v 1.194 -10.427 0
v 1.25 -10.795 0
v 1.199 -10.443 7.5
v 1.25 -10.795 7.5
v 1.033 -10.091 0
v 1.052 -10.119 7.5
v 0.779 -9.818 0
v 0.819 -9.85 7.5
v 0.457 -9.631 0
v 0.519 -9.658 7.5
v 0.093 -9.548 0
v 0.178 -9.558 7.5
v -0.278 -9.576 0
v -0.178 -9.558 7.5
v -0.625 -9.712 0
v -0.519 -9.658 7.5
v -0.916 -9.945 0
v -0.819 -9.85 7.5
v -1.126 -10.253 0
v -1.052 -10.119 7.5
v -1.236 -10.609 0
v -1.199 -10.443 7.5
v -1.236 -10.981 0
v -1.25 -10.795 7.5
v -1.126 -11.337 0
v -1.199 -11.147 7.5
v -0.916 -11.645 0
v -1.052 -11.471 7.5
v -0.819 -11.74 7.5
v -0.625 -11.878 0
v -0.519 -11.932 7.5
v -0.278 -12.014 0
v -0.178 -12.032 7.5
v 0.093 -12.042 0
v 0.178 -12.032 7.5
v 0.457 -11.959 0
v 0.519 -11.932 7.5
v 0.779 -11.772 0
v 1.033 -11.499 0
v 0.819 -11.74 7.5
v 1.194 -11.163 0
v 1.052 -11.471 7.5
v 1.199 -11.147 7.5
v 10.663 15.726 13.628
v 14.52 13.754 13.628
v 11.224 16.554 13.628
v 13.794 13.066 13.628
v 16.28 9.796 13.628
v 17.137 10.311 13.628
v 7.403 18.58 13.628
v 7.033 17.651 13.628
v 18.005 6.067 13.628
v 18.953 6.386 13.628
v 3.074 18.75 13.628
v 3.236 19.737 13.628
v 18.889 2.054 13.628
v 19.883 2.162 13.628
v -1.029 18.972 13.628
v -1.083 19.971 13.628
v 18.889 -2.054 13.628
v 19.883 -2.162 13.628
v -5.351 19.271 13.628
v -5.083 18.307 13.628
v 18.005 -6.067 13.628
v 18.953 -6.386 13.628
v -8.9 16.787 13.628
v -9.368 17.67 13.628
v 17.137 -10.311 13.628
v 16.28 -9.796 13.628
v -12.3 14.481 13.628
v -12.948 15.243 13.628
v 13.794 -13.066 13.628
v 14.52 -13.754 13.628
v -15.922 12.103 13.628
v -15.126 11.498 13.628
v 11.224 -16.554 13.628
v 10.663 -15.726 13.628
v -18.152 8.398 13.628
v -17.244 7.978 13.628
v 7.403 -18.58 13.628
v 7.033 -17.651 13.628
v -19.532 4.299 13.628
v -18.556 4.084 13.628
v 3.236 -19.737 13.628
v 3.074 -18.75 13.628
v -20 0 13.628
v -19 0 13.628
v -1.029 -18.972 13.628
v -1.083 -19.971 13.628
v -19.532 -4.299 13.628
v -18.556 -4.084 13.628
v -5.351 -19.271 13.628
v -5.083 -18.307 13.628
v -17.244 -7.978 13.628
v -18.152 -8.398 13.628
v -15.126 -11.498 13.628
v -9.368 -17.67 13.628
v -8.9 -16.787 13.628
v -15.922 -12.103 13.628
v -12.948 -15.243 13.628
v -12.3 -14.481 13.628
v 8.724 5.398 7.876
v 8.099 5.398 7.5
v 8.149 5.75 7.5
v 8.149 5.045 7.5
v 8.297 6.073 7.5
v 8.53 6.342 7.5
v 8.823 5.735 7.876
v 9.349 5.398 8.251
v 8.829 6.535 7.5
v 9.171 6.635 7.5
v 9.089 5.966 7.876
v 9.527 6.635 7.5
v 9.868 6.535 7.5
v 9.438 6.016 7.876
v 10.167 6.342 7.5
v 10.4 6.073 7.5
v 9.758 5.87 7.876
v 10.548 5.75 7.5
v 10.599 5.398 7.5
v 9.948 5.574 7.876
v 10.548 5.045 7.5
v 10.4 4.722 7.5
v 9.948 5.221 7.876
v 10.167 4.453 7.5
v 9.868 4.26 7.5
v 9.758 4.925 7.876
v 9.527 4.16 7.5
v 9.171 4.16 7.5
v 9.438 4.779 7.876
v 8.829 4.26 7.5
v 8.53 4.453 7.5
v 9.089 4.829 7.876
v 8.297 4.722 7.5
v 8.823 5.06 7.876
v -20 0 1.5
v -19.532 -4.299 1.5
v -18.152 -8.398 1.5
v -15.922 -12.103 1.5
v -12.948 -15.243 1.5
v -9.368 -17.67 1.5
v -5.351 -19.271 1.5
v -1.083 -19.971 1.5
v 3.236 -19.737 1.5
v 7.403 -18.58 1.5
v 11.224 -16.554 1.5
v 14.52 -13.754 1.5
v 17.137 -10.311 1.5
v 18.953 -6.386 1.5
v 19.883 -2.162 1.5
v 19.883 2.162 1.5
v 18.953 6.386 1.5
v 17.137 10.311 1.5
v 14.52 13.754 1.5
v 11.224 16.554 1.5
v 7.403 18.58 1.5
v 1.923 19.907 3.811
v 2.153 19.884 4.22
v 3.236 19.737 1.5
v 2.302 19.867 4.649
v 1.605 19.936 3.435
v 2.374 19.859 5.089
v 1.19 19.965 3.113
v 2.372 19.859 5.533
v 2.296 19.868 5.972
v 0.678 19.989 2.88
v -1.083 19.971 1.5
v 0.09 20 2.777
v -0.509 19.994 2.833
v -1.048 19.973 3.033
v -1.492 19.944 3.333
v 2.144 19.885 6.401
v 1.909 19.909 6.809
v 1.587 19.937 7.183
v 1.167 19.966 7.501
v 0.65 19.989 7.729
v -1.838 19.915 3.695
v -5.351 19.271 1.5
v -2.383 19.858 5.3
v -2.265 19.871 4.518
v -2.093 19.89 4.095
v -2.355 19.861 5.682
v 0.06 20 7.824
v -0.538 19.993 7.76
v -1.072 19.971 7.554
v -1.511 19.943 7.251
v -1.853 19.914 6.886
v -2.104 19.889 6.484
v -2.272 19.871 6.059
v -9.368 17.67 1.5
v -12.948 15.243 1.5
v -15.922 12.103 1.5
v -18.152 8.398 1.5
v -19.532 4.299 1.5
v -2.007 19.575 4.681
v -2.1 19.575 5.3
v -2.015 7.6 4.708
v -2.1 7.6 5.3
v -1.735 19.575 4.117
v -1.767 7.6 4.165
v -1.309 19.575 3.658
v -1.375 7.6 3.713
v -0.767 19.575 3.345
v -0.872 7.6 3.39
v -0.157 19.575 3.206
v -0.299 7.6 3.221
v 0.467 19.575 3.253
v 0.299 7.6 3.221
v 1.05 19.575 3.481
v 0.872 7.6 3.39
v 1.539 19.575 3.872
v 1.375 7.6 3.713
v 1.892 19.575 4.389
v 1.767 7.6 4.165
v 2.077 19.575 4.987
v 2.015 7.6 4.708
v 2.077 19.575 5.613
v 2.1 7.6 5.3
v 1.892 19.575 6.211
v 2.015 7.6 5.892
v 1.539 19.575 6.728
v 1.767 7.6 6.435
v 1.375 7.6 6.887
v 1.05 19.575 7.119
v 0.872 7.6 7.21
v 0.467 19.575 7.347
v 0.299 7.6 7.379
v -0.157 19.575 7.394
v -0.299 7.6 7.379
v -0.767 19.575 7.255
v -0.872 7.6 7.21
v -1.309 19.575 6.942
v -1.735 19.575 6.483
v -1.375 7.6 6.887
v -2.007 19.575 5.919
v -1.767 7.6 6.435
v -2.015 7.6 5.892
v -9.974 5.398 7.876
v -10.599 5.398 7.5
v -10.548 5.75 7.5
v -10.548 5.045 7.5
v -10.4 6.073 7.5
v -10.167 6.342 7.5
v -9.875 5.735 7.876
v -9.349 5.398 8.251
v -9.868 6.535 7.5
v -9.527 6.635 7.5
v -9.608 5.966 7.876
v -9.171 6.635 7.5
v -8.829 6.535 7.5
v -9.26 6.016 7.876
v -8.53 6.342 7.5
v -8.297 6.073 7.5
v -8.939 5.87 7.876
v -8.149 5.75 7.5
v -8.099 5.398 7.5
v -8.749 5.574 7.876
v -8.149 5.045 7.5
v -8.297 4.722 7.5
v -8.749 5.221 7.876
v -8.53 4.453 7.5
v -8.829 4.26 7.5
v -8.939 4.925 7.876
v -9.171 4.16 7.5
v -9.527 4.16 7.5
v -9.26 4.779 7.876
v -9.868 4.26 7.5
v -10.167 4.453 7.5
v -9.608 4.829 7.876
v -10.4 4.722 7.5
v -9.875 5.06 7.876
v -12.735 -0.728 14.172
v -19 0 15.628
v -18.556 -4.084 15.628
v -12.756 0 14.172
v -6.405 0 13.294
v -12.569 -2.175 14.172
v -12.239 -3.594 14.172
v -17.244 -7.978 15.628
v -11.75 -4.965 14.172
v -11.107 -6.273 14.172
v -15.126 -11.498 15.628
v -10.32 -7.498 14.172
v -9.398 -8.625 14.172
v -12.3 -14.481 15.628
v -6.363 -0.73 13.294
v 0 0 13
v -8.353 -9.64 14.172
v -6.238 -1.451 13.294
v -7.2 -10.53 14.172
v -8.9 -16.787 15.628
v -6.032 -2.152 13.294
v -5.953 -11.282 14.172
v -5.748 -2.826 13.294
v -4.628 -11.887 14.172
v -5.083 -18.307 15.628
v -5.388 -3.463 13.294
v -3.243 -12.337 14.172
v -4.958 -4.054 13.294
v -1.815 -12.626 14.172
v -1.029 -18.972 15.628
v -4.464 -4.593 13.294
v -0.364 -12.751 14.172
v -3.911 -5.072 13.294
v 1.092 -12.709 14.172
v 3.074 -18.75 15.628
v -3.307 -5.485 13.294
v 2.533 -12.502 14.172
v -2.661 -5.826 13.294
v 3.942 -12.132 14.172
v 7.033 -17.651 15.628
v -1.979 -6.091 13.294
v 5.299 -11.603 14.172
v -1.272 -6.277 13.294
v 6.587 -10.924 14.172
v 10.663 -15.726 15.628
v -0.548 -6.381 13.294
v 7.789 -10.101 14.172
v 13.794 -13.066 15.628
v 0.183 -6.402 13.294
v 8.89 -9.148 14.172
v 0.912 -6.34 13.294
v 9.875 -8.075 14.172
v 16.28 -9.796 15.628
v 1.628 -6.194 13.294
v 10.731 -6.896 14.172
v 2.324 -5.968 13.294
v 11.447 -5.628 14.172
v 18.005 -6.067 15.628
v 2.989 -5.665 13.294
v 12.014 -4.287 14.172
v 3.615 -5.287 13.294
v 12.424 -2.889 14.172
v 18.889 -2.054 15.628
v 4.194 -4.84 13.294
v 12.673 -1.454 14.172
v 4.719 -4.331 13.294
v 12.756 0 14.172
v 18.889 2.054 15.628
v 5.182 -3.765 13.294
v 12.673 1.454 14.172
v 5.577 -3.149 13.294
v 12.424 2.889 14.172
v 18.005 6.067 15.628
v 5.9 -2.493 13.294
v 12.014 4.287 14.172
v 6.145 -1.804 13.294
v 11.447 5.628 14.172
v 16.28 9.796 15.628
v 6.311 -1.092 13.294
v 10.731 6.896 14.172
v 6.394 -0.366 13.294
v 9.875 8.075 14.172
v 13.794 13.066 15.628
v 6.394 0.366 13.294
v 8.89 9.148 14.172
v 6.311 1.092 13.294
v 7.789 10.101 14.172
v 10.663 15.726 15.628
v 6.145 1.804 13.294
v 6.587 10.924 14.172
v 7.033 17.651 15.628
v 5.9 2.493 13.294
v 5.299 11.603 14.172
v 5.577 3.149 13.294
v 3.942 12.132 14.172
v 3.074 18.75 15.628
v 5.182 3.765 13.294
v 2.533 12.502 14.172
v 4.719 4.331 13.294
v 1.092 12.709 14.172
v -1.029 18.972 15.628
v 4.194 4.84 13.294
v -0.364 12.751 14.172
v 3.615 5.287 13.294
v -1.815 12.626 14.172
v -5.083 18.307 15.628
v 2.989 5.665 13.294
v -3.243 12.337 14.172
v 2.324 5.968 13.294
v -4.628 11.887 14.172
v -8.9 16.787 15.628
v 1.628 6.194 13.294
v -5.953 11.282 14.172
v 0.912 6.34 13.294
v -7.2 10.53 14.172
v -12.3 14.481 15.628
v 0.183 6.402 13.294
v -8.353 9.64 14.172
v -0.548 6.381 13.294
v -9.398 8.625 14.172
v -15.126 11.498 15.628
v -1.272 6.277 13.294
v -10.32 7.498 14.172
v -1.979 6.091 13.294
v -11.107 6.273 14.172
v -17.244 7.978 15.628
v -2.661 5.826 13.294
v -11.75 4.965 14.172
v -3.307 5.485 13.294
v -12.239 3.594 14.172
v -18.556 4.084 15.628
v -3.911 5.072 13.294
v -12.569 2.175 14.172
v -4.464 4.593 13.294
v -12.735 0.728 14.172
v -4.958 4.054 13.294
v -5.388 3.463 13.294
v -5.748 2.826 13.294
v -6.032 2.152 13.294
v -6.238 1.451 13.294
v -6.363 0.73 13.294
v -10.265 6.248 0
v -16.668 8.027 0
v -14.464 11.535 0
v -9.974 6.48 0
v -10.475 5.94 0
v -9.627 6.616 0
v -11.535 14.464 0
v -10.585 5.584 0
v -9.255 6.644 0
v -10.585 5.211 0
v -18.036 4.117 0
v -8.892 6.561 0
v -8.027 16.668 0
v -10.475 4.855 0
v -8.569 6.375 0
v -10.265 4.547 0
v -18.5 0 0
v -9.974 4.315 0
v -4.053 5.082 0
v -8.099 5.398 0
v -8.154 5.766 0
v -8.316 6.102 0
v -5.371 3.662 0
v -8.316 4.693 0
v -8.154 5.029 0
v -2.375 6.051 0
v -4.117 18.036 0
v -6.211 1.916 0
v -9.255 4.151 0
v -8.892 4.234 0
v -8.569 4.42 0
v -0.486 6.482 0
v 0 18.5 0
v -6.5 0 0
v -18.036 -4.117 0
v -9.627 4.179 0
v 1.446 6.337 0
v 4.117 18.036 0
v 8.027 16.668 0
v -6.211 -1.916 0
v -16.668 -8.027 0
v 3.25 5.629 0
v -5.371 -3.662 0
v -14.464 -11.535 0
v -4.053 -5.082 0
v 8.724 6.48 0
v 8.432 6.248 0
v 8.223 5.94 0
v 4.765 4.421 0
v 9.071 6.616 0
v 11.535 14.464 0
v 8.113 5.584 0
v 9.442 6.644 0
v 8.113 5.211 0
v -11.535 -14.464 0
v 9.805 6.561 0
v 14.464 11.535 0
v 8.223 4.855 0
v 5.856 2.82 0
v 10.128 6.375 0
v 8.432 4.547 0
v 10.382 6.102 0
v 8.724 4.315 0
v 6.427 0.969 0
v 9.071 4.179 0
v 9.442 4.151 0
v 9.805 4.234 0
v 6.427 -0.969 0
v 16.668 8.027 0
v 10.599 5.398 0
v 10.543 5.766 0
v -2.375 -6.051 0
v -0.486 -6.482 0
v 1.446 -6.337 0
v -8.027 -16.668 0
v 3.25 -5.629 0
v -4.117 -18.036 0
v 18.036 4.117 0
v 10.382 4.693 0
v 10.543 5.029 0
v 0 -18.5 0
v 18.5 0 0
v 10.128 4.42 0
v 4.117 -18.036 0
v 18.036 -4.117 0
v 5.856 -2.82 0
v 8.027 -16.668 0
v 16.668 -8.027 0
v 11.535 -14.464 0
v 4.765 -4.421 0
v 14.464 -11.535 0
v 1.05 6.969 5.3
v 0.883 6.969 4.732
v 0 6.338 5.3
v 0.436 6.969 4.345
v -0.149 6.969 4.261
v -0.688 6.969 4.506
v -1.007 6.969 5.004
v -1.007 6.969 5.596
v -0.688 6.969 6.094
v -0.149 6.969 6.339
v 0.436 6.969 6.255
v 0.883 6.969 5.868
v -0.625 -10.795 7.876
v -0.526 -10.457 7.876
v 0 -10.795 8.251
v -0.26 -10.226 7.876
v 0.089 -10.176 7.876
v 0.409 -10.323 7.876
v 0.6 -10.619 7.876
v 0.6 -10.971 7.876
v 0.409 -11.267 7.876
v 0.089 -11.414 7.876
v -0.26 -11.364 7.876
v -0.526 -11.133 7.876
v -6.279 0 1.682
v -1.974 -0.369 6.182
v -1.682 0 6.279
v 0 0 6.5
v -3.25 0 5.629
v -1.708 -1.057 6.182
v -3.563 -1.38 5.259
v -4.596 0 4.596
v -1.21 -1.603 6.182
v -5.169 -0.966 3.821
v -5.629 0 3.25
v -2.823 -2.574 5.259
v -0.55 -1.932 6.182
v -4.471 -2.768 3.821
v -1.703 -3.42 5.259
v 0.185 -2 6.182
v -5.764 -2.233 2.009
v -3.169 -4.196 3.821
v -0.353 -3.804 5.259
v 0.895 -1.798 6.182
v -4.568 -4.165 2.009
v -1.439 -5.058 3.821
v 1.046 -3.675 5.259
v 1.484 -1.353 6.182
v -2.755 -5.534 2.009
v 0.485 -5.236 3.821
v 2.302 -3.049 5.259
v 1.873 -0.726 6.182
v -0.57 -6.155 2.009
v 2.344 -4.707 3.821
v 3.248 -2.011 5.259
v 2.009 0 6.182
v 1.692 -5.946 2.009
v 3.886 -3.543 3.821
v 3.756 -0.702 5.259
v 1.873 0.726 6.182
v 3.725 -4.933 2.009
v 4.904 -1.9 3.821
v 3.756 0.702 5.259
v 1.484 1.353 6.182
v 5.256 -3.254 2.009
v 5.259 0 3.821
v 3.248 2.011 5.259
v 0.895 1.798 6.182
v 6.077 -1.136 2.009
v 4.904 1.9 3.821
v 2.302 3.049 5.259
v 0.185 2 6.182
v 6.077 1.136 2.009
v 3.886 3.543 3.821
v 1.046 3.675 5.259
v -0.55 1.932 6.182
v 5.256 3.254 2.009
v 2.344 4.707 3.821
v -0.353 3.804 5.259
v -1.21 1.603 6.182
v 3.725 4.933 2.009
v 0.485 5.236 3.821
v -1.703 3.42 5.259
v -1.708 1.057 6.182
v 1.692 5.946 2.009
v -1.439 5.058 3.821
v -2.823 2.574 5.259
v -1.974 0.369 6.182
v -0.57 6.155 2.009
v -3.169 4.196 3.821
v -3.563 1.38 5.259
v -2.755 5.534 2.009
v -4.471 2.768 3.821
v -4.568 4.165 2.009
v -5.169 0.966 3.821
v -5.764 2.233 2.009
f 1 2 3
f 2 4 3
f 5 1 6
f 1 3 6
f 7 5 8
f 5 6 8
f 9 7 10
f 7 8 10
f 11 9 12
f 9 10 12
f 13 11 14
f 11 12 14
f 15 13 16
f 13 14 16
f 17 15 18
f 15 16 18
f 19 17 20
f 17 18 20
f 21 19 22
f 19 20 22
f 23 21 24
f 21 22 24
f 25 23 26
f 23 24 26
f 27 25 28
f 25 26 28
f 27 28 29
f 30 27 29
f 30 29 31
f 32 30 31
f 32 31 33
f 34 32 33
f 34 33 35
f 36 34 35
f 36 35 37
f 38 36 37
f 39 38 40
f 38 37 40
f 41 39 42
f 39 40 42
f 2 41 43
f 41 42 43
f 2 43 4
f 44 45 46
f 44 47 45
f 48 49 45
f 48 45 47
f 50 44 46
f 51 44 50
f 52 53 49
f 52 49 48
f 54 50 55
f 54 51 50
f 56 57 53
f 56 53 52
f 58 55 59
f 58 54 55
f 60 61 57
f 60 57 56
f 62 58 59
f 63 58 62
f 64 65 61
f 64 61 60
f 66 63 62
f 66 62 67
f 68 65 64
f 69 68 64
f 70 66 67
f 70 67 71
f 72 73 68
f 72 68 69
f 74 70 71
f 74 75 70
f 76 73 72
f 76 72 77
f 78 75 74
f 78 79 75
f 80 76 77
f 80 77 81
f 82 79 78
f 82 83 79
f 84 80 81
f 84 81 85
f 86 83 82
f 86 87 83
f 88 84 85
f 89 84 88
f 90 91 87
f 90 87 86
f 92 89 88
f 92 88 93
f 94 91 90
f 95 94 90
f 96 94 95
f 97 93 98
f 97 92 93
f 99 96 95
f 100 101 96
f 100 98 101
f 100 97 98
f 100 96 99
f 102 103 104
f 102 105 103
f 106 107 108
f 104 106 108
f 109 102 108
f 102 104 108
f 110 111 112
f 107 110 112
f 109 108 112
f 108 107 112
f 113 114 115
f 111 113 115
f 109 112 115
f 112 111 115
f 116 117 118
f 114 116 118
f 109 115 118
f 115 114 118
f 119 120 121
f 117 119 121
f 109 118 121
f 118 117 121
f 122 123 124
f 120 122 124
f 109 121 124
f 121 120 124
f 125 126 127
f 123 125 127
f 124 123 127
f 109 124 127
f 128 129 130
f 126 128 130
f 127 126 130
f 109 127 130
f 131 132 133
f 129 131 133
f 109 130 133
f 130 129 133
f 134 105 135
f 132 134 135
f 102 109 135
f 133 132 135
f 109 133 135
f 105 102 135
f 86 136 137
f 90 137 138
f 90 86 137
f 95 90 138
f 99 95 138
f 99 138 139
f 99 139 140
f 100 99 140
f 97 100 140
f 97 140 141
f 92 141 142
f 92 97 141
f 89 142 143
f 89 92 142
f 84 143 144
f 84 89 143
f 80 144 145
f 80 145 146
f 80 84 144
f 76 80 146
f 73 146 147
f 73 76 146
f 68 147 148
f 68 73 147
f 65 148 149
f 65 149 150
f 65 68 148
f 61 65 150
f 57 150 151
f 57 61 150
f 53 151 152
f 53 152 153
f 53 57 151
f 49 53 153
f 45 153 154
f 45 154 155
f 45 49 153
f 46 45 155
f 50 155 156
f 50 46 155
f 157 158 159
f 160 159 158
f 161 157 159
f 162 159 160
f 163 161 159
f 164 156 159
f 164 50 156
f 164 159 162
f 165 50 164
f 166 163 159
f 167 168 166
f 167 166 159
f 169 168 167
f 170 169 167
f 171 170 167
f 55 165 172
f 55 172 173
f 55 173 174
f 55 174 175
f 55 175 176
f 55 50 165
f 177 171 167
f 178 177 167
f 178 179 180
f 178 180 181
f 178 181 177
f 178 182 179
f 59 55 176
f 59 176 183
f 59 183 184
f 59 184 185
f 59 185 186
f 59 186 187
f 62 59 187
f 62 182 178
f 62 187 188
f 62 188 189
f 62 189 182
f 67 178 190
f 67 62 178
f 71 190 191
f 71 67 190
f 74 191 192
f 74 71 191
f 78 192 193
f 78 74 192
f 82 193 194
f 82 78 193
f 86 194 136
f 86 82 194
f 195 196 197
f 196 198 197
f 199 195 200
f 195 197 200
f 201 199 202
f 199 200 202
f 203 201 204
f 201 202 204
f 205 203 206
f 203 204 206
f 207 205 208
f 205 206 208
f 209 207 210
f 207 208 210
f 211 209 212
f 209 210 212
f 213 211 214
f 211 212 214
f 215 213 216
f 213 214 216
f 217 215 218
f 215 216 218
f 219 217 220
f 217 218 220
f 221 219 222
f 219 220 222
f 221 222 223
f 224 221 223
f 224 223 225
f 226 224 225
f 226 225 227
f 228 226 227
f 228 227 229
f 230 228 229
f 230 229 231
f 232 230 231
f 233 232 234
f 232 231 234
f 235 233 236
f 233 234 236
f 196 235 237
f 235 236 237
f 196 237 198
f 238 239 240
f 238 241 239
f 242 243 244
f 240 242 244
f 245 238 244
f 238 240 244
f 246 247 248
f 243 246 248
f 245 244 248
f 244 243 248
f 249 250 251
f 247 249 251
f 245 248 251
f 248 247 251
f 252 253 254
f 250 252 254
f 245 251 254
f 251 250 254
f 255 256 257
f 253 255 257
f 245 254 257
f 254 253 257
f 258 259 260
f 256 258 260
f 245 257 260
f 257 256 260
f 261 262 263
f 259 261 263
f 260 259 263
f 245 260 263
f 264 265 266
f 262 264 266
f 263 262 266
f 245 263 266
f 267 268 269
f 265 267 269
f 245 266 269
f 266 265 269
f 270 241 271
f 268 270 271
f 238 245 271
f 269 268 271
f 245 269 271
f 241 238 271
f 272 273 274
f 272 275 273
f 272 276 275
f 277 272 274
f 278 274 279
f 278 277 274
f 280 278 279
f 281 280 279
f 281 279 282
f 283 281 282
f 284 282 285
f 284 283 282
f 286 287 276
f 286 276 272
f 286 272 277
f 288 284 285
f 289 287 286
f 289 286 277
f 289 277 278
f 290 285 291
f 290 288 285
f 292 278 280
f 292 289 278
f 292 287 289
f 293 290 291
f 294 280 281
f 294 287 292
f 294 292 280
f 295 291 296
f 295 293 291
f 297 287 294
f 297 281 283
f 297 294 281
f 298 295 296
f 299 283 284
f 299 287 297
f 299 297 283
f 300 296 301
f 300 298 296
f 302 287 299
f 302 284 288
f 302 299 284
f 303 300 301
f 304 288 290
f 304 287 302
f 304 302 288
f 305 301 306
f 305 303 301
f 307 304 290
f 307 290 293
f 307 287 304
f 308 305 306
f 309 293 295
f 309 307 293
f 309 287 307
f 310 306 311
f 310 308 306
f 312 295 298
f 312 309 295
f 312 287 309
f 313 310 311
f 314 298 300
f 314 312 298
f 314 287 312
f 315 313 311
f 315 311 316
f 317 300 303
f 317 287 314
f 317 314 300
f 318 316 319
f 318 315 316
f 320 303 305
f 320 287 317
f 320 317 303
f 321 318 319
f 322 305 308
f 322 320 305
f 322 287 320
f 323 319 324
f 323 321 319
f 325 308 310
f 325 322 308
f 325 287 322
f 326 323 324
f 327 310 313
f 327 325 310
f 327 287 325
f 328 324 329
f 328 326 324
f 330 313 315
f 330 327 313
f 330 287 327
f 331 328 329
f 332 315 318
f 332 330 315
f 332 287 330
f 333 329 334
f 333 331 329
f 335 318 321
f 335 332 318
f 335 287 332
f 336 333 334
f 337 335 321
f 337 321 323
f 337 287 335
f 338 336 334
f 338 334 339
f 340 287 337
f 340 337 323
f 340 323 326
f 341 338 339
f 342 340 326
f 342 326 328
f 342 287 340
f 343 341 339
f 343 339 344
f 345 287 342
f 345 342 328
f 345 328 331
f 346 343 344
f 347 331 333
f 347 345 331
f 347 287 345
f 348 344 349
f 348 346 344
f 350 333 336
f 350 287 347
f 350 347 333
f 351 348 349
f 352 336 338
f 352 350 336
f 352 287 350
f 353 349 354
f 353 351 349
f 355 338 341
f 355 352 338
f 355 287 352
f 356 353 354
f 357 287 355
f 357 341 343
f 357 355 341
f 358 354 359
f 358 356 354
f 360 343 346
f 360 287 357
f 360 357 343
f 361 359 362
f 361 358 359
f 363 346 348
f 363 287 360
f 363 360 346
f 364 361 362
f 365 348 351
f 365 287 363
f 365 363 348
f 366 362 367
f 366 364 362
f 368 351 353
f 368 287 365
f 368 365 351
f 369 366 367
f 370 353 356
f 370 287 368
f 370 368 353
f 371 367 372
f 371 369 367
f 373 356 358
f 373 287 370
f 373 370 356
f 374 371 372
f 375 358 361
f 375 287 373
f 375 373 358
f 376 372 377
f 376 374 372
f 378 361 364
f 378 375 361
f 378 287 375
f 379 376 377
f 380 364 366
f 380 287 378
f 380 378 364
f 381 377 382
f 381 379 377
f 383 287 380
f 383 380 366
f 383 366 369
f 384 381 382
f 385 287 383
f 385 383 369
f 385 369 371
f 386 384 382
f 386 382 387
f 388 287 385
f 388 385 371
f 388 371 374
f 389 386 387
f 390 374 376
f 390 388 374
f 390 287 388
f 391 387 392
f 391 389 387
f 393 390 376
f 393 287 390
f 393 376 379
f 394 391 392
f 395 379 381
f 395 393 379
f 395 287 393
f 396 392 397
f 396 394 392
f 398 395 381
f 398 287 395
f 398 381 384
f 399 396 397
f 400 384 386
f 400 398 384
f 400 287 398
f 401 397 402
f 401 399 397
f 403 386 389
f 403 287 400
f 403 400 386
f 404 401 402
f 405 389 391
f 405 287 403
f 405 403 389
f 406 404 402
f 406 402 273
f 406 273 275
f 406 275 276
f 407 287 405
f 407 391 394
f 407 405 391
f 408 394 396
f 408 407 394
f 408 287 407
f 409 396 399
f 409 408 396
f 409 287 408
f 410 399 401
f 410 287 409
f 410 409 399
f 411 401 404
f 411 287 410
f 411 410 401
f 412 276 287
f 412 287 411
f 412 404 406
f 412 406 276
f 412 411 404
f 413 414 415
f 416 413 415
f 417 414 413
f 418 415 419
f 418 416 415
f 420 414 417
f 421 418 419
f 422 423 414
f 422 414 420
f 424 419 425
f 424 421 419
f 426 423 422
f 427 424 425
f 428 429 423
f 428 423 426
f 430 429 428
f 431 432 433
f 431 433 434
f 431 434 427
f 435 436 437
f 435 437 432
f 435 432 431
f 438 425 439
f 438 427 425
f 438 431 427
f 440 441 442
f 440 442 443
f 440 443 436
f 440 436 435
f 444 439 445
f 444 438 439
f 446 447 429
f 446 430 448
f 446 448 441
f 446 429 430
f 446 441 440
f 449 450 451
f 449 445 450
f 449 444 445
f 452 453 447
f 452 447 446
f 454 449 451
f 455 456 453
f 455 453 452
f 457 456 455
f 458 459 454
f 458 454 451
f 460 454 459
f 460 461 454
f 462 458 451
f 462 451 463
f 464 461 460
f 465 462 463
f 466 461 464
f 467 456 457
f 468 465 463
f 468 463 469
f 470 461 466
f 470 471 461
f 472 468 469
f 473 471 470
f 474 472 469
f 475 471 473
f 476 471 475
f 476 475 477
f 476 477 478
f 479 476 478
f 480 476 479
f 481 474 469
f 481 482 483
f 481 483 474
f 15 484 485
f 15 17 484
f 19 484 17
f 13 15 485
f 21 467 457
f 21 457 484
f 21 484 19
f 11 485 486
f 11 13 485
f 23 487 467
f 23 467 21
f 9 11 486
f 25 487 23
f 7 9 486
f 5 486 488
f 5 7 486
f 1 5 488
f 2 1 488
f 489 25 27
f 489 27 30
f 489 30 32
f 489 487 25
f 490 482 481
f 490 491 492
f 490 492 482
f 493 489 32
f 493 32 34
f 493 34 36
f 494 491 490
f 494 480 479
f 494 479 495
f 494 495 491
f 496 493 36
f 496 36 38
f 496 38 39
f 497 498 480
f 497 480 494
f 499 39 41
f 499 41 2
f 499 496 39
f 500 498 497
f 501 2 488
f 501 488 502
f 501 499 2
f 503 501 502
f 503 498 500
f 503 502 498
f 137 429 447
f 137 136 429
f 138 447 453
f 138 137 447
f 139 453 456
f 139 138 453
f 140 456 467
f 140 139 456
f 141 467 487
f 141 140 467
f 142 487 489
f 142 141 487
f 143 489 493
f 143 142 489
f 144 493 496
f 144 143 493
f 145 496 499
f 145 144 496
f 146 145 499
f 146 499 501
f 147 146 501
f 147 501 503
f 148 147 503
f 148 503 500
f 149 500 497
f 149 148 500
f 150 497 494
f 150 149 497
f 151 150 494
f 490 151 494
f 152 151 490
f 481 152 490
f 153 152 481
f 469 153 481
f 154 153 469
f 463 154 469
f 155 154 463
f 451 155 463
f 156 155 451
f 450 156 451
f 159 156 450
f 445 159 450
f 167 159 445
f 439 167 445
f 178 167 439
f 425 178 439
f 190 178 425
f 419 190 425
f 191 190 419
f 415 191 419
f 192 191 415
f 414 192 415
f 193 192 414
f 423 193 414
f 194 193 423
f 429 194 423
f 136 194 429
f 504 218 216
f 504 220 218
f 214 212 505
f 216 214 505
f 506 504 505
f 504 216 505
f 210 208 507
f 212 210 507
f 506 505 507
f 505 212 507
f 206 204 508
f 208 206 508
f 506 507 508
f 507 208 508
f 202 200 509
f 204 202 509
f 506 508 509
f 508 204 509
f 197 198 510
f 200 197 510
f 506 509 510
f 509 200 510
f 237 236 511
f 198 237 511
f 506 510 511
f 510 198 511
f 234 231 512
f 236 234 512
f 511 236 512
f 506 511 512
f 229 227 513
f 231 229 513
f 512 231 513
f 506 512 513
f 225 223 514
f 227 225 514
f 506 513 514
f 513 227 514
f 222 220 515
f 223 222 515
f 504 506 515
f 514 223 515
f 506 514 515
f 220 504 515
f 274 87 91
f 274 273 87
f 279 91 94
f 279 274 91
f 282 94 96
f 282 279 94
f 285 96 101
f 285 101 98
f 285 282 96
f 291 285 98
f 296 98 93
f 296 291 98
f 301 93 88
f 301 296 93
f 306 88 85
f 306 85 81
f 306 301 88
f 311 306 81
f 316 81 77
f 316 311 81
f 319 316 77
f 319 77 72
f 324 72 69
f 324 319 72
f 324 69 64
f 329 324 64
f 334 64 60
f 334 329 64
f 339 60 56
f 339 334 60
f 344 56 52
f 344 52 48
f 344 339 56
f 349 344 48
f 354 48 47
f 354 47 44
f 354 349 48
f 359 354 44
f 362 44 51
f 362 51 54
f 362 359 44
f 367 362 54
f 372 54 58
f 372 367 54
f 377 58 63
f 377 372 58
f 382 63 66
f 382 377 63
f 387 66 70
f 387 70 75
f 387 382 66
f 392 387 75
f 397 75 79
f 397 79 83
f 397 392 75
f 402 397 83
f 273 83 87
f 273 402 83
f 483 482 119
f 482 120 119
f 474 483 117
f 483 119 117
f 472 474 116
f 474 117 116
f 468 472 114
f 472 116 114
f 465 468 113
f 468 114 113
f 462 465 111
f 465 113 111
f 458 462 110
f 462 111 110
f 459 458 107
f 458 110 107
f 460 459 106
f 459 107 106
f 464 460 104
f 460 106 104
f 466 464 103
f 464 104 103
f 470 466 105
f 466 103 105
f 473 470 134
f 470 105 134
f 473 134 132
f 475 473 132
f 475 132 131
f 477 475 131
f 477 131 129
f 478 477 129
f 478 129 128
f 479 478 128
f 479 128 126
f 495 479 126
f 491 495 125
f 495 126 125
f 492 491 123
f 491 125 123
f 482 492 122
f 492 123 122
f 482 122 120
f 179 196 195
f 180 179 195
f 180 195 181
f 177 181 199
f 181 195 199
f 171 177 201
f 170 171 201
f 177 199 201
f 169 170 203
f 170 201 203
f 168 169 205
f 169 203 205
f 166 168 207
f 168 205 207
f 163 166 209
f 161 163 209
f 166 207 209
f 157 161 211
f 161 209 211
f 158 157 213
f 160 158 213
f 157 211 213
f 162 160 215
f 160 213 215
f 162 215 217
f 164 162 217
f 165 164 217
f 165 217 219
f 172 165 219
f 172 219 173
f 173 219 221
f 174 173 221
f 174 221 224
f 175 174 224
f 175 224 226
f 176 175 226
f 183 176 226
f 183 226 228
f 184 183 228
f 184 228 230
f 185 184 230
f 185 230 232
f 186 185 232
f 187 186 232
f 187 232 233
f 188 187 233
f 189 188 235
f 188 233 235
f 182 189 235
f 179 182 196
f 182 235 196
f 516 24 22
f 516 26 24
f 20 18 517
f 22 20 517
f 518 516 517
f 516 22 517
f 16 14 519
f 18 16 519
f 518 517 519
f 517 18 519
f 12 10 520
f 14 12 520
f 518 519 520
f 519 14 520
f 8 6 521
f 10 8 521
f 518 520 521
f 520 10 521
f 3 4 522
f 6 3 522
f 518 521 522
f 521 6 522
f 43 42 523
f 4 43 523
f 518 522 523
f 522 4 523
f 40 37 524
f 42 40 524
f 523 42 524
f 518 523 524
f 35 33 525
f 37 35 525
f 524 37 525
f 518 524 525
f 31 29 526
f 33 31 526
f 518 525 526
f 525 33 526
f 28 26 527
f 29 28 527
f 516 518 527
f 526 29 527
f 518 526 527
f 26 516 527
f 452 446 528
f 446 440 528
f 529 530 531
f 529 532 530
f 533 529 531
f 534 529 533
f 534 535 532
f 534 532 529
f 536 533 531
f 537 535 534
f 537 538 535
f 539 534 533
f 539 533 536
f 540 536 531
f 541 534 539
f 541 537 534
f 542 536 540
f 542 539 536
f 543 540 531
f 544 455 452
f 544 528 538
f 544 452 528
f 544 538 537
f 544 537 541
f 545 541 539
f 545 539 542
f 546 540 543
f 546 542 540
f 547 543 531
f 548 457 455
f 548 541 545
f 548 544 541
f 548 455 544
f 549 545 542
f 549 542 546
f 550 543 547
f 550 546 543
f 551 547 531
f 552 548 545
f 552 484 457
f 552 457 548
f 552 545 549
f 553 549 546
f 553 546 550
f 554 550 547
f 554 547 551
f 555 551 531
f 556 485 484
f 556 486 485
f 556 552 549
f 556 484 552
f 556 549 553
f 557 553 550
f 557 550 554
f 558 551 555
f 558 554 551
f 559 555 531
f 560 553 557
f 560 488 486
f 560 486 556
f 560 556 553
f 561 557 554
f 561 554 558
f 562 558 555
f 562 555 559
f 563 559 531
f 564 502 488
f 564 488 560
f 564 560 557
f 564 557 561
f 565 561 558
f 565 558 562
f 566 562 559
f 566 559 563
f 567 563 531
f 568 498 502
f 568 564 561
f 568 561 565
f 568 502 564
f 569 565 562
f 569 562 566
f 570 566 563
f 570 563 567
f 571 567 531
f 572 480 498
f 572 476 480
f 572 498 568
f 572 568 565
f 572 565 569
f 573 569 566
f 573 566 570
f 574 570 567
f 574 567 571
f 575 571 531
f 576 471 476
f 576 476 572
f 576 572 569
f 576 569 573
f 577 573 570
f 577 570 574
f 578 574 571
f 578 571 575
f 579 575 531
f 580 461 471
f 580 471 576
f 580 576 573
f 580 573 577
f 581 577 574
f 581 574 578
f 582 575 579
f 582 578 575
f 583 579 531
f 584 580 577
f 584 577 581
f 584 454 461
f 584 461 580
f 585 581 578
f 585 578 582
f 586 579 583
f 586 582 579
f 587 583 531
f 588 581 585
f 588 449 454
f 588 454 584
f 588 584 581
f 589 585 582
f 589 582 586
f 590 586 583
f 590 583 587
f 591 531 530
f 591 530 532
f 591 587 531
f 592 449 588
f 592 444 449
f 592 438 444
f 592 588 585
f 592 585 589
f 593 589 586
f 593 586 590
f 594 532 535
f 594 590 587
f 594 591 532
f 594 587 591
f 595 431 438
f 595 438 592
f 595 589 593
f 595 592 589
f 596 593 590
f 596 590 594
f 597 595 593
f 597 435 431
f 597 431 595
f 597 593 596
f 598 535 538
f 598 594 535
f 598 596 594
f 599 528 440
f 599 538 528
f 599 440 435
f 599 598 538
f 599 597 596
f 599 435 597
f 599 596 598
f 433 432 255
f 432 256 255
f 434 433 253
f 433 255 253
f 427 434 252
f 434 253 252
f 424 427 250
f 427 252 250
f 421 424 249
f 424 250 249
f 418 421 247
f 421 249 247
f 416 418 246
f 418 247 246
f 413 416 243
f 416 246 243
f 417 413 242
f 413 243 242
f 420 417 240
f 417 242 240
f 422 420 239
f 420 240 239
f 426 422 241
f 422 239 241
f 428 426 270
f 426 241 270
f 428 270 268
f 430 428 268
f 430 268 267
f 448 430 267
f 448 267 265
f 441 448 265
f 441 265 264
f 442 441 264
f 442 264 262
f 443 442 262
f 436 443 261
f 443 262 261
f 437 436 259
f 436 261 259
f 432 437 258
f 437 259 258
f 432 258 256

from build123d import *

# Parameters (mm, degrees)
M3_TAPPED_HOLE1_D           = 2.5
M3_TAPPED_HOLE1_DEPTH       = 7.5
M3_TAPPED_HOLE1_TIP         = 0.751075774
M5_TAPPED_HOLE1_D           = 4.2
M5_TAPPED_HOLE1_DEPTH       = 12.4
M5_TAPPED_HOLE1_CSINK_D     = 5.05
M5_TAPPED_HOLE1_CSINK_ANGLE = 90
M5_TAPPED_HOLE1_TIP         = 1.2618073


with BuildPart() as part:
    # Sketch1 → Revolve1 (revolve)
    with BuildSketch(Plane(origin=(0, 0, 0), x_dir=(1, 0, 0), z_dir=(0, 1, 0))):
        with BuildLine():
            ThreePointArc((0, -6.5), (-4.596194078, -4.596194078), (-6.5, 0))
            Line((-6.5, 0), (-18.5, 0))
            Line((-18.5, 0), (-20, -1.5))
            Line((-20, -1.5), (-20, -13.627898949))
            Line((-20, -13.627898949), (-19, -13.627898949))
            Line((-19, -13.627898949), (-19, -15.627898949))
            ThreePointArc((-19, -15.627898949), (-9.590436029, -13.660086986), (0, -13))
            Line((0, -13), (0, -6.5))
        make_face()
    revolve(axis=Axis((0, 0, -56.528501867), (0, 0, 1)))

    # M3 Tapped Hole1
    with Locations(Plane(origin=(0, 0, 0), x_dir=(-1, 0, 0), z_dir=(0, 0, -1))):
        with Locations((0, -10.795), (-9.348744234, 5.3975), (9.348744234, 5.3975)):
            Hole(M3_TAPPED_HOLE1_D / 2, depth=M3_TAPPED_HOLE1_DEPTH)
            with Locations((0, 0, -(M3_TAPPED_HOLE1_DEPTH + M3_TAPPED_HOLE1_TIP / 2))):  # 118° drill point
                Cone(0, M3_TAPPED_HOLE1_D / 2, M3_TAPPED_HOLE1_TIP, mode=Mode.SUBTRACT)

    # M5 Tapped Hole1
    with Locations(Plane(origin=(0, 20, 0), x_dir=(1, 0, 0), z_dir=(0, 1, 0))):
        with Locations((0, -5.3)):
            CounterSinkHole(M5_TAPPED_HOLE1_D / 2, M5_TAPPED_HOLE1_CSINK_D / 2, depth=M5_TAPPED_HOLE1_DEPTH, counter_sink_angle=M5_TAPPED_HOLE1_CSINK_ANGLE)
            with Locations((0, 0, -(M5_TAPPED_HOLE1_DEPTH + M5_TAPPED_HOLE1_TIP / 2))):  # 118° drill point
                Cone(0, M5_TAPPED_HOLE1_D / 2, M5_TAPPED_HOLE1_TIP, mode=Mode.SUBTRACT)


solid = part.part
